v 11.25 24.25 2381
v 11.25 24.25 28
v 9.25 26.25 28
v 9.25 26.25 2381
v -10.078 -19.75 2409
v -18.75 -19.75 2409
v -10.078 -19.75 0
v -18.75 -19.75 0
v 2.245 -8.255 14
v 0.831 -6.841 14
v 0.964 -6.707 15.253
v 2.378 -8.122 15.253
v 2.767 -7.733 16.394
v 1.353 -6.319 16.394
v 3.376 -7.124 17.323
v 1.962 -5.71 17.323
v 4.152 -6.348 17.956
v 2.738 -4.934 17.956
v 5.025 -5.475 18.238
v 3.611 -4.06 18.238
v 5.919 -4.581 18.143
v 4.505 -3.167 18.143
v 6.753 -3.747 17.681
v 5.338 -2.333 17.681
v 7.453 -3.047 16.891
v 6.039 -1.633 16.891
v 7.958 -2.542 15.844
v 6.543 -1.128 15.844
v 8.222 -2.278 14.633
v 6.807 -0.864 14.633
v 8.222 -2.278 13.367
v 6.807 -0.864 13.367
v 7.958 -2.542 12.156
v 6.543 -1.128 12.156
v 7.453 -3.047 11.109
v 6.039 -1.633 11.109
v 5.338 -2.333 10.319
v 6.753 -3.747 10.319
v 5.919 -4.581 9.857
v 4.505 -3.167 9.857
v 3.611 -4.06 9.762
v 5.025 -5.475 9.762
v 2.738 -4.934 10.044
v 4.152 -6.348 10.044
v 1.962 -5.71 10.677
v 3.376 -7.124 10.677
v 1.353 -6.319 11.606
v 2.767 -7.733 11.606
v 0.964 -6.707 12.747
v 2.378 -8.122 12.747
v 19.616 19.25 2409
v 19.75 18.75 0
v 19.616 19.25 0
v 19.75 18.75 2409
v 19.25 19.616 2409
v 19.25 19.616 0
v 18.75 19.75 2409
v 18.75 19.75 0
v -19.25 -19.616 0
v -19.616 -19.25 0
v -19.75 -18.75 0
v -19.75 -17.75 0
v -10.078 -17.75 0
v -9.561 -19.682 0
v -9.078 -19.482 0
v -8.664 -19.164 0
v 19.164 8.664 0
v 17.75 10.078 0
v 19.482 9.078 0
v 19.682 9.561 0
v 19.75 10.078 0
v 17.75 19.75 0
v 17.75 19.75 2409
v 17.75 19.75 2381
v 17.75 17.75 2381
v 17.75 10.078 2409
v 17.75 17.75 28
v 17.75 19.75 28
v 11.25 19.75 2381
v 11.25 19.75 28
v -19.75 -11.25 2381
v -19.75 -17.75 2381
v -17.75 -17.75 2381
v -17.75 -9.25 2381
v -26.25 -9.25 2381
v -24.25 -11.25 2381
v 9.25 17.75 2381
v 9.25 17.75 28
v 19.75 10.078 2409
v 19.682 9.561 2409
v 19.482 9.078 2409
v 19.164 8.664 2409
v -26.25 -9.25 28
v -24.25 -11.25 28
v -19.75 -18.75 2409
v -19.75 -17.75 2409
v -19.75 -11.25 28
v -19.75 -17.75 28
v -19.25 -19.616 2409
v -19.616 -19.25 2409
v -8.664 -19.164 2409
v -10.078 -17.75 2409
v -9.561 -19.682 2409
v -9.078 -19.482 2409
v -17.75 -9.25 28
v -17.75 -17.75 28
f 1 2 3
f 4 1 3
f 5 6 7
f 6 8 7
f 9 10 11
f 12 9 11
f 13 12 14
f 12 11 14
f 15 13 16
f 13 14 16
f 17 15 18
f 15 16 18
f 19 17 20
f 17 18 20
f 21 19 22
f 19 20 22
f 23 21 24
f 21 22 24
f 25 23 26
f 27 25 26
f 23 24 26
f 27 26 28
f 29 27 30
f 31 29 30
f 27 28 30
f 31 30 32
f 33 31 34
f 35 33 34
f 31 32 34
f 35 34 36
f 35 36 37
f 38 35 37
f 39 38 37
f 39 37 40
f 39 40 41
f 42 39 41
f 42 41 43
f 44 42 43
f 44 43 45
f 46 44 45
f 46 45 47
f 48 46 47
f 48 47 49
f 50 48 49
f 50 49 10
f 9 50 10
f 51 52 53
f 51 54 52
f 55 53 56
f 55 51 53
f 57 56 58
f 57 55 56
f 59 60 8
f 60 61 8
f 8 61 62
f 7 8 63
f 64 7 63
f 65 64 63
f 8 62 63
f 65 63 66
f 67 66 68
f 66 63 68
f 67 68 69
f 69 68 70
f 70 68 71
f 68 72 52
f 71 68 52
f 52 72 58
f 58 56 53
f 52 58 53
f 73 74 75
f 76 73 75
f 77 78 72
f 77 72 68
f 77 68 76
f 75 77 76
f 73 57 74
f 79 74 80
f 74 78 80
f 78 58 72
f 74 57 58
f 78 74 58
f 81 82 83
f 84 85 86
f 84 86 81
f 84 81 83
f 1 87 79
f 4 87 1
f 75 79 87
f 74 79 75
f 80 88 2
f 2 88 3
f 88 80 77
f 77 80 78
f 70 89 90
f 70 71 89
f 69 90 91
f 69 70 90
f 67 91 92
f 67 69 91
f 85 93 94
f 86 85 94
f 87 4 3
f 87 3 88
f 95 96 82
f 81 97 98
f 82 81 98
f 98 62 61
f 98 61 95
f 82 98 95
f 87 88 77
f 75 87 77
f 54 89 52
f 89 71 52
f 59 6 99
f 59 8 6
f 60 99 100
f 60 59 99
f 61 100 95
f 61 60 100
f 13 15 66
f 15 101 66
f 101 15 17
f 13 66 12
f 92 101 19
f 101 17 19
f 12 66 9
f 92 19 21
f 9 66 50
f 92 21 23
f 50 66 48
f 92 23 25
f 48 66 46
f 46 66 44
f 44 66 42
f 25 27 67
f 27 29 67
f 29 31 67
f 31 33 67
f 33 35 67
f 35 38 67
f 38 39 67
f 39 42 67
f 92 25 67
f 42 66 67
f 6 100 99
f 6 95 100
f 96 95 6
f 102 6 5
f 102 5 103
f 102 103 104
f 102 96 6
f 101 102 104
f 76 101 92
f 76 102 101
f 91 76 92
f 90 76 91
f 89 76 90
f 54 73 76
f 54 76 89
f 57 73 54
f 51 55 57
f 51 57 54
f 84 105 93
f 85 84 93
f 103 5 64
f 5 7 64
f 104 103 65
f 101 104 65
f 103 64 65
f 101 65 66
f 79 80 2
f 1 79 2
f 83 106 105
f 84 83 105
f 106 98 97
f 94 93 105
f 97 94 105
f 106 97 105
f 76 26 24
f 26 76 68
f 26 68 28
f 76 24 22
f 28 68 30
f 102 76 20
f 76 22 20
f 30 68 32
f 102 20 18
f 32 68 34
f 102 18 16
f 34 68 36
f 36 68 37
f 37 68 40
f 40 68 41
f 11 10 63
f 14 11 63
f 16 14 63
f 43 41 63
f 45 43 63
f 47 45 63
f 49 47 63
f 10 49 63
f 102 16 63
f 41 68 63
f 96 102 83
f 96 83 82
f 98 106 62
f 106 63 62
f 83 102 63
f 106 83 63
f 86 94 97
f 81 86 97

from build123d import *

# Parameters (mm, degrees)
F1_DEPTH = 28
F3_DEPTH = 2353
F5_DEPTH = 28
F6_R     = 2
F7_R     = 1
F8_R     = 4.25
F9_DEPTH = 25


with BuildPart() as f1:
    # F0 (on Top) → F1 (new body)
    with BuildSketch(Plane.XY):
        Polygon((-19.75, -17.750001), (-19.75, -19.75), (-9.25, -19.75), (19.75, 9.25), (19.75, 19.75), (17.750001, 19.75), (17.750001, 10.078427), (-10.078427, -17.750001), align=None)
    extrude(amount=F1_DEPTH)

    # F2 (on face) → F3 (join)
    with BuildSketch(Plane.XY.offset(28)):
        Polygon((-19.75, -19.75), (-9.25, -19.75), (19.75, 9.25), (19.75, 19.75), (11.25, 19.75), (11.25, 24.25), (9.25, 26.25), (9.25, 23.421573), (9.25, 19.75), (9.25, 17.750001), (17.750001, 17.750001), (17.750001, 10.078427), (16.585787, 8.914213), (-8.914213, -16.585787), (-10.078427, -17.750001), (-17.750001, -17.750001), (-17.750001, -9.25), (-19.75, -9.25), (-23.421573, -9.25), (-26.25, -9.25), (-24.25, -11.25), (-19.75, -11.25), align=None)
    extrude(amount=F3_DEPTH)

    # F4 (on face) → F5 (join)
    with BuildSketch(Plane.XY.offset(2381)):
        Polygon((19.75, 9.25), (19.75, 19.75), (17.750001, 19.75), (17.750001, 10.078427), (-10.078427, -17.750001), (-19.75, -17.750001), (-19.75, -19.75), (-9.25, -19.75), align=None)
    extrude(amount=F5_DEPTH)

    # F6
    f6_edges = [f1.edges().sort_by_distance(p)[0] for p in [
        (19.75, 9.25, 1204.5),
        (-9.25, -19.75, 1204.5),
    ]]
    fillet(f6_edges, radius=F6_R)

    # F7
    f7_edges = [f1.edges().sort_by_distance(p)[0] for p in [
        (-19.75, -19.75, 1204.5),
        (19.75, 19.75, 1204.5),
    ]]
    fillet(f7_edges, radius=F7_R)

    # F8 (on face) → F9 (cut)
    with BuildSketch(Plane(origin=(3.835787, -3.835787, 0), x_dir=(-0.707107, -0.707107, 0), z_dir=(-0.707107, 0.707107, 0))):
        with Locations((0, 14)):
            Circle(F8_R)
    extrude(amount=-F9_DEPTH, mode=Mode.SUBTRACT)


solid = f1.part
